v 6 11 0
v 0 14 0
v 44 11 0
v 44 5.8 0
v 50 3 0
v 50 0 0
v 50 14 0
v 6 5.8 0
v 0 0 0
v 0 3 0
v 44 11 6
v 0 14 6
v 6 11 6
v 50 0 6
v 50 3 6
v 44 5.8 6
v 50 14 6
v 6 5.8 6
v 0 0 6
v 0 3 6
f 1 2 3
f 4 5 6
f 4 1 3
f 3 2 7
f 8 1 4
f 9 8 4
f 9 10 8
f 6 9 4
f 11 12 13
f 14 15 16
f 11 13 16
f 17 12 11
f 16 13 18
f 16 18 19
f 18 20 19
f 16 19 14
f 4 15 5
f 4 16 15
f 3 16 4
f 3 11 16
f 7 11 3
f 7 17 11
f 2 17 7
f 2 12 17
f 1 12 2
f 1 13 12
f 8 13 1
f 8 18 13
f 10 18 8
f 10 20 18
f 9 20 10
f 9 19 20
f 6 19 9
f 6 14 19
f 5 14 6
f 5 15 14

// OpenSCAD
$fn = 32;

// ----------------------------------------------------------------------
// Key bar: dovetail key, 6 mm thick
// ----------------------------------------------------------------------

// --- parameters (mm) ---
profile_height = 6;       // extrusion height
profile_points = 10;      // points of the closed outline

profile = [[0, 0], [50, 0], [50, 3], [44, 5.8], [44, 11], [50, 14], [0, 14], [6, 11], [6, 5.8], [0, 3]];  // single closed polygon, 10 points, counter clockwise

// --- the one profile operation ---
linear_extrude(height = profile_height) polygon(points = profile);
